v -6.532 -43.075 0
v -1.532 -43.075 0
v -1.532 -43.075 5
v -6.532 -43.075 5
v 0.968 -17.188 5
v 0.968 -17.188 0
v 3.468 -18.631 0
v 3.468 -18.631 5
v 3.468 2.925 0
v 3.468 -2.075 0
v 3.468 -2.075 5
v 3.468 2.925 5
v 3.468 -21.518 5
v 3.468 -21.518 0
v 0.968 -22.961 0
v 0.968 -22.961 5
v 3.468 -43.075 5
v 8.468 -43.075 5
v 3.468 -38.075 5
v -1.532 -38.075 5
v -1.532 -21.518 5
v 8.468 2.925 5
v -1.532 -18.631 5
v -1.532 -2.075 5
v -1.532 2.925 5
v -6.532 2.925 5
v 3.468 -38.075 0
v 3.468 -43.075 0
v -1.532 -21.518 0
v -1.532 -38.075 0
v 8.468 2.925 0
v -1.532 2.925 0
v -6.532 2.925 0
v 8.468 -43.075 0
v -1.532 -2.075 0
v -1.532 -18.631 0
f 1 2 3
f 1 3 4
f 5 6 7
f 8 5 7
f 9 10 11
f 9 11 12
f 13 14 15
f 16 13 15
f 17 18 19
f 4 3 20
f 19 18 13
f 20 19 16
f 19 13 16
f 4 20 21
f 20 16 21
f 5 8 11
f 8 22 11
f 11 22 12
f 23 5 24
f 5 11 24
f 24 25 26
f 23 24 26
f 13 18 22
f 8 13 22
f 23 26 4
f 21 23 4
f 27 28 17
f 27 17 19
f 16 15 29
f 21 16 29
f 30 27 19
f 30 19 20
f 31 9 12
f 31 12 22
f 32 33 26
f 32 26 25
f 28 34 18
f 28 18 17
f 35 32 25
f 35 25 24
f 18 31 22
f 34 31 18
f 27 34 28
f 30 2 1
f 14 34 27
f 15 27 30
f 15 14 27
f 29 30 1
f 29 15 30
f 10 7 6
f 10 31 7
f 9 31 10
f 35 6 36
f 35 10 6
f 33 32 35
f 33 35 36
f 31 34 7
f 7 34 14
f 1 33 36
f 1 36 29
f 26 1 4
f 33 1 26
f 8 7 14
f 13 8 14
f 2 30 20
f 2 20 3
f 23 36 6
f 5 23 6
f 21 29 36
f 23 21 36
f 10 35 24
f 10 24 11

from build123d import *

# Parameters (mm, degrees)
BOSS_EXTRU_1_DEPTH = 5
CUT_EXTRUDE1_DEPTH = 10


with BuildPart() as part:
    # Esquisse1 → Boss.-Extru.1 (new body)
    with BuildSketch(Plane.XY):
        Polygon((3.468077367, 2.92543021), (8.468077367, 2.92543021), (8.468077367, -43.07456979), (3.468077367, -43.07456979), (3.468077367, -38.07456979), (-1.531922633, -38.07456979), (-1.531922633, -43.07456979), (-6.531922633, -43.07456979), (-6.531922633, 2.92543021), (-1.531922633, 2.92543021), (-1.531922633, -2.07456979), (3.468077367, -2.07456979), align=None)
    extrude(amount=BOSS_EXTRU_1_DEPTH)

    # Esquisse2 → Cut-Extrude1 (cut)
    with BuildSketch(Plane(origin=(0, 0, 0), x_dir=(-1, 0, 0), z_dir=(0, 0, -1))):
        Polygon((-3.468077367, -21.517945463), (-0.968077367, -22.961321136), (1.531922633, -21.517945463), (1.531922633, -18.631194117), (-0.968077367, -17.187818444), (-3.468077367, -18.631194117), align=None)
    extrude(amount=-CUT_EXTRUDE1_DEPTH, mode=Mode.SUBTRACT)


solid = part.part
